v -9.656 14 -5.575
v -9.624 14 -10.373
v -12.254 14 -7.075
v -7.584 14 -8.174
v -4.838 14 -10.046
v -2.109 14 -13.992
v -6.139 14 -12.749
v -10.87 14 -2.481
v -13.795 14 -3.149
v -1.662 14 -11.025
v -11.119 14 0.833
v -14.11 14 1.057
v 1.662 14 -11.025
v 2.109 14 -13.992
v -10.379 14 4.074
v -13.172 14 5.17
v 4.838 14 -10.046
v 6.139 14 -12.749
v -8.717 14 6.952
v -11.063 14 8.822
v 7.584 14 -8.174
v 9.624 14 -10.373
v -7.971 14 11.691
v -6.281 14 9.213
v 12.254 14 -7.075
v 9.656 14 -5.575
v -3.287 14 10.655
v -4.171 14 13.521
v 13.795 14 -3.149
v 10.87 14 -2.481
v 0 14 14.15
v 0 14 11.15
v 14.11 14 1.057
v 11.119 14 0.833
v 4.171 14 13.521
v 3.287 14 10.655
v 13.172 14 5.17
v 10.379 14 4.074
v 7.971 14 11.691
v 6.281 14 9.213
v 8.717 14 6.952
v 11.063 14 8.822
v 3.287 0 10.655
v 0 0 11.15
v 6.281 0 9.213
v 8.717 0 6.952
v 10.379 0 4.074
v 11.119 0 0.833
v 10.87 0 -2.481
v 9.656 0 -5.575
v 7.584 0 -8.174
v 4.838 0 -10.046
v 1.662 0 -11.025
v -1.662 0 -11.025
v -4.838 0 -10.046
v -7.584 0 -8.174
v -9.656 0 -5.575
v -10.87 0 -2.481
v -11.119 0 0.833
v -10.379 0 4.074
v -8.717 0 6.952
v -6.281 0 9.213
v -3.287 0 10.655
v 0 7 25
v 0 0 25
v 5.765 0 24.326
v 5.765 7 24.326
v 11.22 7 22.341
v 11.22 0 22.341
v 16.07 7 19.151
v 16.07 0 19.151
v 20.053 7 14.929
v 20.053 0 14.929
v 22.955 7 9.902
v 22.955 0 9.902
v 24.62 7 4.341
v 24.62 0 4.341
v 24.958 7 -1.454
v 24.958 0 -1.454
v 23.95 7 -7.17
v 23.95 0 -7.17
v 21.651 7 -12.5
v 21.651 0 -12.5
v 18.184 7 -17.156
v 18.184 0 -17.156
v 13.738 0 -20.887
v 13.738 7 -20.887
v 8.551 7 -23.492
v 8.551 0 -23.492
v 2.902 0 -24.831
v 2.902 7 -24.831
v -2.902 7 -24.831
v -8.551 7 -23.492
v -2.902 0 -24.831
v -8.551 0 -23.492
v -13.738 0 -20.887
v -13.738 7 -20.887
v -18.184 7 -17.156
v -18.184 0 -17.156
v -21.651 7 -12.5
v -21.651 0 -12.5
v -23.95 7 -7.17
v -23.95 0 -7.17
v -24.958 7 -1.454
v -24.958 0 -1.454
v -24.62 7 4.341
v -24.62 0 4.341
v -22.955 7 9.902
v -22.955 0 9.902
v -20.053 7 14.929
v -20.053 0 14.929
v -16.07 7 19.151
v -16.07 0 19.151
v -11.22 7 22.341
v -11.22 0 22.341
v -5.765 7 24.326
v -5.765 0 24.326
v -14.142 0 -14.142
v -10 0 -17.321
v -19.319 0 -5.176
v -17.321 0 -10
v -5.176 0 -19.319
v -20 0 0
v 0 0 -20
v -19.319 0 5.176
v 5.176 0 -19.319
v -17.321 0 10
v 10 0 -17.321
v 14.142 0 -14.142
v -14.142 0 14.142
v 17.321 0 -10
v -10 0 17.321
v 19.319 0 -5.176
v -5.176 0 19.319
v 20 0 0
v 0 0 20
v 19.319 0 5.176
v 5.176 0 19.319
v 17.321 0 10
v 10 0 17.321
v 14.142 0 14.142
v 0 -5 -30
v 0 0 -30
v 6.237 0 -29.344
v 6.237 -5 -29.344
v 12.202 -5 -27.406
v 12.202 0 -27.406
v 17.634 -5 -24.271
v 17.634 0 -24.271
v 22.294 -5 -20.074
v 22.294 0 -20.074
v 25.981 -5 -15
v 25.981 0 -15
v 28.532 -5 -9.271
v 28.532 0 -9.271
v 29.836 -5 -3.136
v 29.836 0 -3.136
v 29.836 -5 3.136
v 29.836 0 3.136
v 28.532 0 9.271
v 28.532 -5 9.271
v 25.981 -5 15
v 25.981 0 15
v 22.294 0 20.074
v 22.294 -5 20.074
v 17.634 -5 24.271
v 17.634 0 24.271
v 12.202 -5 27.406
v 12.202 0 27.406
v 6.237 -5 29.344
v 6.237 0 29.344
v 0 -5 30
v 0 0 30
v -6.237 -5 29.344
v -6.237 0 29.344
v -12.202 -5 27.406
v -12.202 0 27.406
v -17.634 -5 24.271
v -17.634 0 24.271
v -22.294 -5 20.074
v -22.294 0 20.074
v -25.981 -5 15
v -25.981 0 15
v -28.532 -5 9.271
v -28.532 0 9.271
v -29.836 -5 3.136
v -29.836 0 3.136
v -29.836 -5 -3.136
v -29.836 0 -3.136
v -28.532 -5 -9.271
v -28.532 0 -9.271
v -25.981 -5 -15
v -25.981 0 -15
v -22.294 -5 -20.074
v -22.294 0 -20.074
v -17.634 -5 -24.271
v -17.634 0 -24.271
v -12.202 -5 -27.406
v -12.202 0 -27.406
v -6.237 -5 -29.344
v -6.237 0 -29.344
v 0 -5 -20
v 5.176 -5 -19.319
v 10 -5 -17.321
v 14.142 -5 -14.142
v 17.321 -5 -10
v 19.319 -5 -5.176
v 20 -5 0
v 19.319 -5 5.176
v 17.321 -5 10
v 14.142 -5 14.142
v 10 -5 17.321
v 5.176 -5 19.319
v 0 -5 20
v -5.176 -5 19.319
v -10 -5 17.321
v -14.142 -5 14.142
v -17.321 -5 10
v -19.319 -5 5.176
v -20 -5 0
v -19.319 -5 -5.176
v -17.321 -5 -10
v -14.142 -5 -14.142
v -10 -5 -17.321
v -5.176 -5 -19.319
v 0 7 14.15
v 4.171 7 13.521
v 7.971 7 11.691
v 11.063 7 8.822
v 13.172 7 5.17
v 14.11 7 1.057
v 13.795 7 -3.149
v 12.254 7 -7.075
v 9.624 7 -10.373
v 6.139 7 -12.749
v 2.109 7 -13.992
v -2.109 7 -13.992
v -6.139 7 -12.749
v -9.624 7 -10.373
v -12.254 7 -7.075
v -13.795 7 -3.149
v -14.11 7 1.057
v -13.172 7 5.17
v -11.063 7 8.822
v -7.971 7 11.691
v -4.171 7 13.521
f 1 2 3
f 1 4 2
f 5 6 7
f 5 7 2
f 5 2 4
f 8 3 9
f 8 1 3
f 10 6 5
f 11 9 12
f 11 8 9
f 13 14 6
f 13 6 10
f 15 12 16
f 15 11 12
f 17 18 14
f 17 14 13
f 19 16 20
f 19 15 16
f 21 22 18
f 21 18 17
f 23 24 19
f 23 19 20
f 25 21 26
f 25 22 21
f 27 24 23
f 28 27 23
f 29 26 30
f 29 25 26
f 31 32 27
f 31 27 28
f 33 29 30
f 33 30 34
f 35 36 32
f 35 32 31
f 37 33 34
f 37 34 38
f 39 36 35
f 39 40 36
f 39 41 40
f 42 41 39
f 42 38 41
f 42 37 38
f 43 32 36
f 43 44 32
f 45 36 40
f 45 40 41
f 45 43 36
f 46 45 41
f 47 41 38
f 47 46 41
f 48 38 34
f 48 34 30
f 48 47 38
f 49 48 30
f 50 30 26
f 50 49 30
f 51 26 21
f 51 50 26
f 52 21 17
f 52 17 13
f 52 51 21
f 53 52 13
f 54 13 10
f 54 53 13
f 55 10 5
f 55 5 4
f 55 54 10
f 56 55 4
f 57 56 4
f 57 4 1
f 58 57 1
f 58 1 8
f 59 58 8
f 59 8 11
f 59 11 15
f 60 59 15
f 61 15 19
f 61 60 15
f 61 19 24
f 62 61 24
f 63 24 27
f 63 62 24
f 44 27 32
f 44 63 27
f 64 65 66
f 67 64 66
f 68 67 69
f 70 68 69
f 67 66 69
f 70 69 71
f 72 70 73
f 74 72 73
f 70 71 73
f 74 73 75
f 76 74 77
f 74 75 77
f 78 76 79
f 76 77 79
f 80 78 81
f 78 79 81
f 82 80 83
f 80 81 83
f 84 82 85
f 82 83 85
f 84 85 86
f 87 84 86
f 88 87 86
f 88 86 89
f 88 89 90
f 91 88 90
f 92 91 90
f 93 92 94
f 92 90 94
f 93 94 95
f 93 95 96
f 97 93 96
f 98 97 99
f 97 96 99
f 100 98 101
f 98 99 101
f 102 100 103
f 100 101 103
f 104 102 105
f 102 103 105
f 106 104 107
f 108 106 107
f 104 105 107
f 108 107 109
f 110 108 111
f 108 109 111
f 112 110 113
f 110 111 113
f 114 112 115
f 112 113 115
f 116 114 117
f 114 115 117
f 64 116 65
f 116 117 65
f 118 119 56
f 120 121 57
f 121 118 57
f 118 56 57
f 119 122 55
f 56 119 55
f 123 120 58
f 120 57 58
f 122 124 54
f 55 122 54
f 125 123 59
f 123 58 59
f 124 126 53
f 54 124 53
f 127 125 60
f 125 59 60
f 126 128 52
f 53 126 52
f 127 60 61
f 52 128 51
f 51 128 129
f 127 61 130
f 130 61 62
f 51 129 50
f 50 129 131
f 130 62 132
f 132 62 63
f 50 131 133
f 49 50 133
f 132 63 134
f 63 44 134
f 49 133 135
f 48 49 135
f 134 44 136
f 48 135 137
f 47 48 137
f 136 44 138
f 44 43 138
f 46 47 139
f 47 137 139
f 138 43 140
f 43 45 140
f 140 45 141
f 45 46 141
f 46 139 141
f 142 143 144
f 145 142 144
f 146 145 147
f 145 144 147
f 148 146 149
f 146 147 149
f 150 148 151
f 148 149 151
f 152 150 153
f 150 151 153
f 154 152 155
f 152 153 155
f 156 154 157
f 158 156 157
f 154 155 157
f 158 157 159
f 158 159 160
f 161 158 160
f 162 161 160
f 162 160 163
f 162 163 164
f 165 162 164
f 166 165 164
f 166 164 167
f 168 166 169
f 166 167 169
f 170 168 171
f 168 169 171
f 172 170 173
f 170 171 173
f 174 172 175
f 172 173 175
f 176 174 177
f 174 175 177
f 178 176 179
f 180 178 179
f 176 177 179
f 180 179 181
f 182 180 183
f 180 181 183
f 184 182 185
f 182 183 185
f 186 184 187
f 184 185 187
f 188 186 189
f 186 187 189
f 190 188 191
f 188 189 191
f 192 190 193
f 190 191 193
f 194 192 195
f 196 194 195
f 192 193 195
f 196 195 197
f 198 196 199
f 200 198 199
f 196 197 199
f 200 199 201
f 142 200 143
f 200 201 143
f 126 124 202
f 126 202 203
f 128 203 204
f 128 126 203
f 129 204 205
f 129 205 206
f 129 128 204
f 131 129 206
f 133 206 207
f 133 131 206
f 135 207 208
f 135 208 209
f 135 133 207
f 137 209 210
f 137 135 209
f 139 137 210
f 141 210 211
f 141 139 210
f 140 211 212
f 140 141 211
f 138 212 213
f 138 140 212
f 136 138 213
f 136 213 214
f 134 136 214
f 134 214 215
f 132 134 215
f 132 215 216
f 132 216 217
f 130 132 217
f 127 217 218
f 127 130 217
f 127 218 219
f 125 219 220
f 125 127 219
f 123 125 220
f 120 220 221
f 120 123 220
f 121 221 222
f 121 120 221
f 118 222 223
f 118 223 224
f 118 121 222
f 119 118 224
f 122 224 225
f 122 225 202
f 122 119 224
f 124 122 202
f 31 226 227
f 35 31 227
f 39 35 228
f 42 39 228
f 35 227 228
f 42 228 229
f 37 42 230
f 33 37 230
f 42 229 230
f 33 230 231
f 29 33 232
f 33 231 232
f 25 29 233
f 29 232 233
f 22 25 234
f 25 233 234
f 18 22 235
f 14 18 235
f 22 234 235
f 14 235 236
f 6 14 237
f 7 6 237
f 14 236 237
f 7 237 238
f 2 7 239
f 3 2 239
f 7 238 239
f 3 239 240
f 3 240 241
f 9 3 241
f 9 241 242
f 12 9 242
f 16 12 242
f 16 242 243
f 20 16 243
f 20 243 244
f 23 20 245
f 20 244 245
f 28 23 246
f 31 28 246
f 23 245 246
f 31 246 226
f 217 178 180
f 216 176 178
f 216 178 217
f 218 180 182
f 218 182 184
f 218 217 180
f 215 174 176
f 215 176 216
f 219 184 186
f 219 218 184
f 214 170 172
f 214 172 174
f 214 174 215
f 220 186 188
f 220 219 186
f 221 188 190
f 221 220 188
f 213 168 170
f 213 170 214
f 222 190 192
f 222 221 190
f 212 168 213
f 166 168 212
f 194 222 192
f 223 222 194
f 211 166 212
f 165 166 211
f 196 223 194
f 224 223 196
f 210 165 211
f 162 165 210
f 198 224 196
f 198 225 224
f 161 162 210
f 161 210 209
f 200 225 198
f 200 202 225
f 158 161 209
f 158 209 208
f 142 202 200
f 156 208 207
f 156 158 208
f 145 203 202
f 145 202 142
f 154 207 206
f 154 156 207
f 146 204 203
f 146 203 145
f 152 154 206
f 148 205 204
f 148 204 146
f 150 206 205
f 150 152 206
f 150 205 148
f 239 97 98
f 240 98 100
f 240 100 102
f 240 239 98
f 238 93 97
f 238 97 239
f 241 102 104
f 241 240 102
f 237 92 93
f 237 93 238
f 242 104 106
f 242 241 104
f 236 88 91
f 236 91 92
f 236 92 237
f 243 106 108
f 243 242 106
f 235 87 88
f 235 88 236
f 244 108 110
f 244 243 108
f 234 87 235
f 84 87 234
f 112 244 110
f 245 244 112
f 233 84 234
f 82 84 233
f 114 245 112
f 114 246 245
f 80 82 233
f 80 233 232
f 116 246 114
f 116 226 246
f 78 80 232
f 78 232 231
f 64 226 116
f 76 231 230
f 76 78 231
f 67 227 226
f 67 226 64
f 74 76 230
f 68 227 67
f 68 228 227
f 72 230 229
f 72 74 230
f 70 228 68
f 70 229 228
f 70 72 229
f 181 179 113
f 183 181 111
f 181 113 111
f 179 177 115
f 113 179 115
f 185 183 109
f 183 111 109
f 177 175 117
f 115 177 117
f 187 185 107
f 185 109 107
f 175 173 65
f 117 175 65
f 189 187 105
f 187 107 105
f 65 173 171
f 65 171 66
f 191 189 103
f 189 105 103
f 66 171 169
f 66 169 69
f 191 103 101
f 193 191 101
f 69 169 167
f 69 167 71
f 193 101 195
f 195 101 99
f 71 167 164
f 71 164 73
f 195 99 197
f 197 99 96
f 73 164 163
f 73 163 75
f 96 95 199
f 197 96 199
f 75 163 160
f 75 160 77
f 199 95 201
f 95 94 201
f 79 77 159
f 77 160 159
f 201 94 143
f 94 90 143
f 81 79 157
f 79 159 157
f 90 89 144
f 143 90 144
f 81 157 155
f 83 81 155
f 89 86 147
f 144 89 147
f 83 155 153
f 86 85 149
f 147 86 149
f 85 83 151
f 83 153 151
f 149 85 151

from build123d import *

# Parameters (mm, degrees)
SKETCH1_R           = 25
SKETCH1_R_2         = 11.15
BOSS_EXTRUDE1_DEPTH = 7
SKETCH2_R           = 14.15
SKETCH2_R_2         = 11.15
BOSS_EXTRUDE2_DEPTH = 7
SKETCH3_R           = 30
SKETCH3_R_2         = 20
BOSS_EXTRUDE3_DEPTH = 5


with BuildPart() as part:
    # Sketch1 → Boss-Extrude1 (new body)
    with BuildSketch(Plane(origin=(0, 0, 0), x_dir=(1, 0, 0), z_dir=(0, 1, 0))):
        with Locations(Location((0, 0, 0), (0, 0, 270))):
            Circle(SKETCH1_R)
        with Locations(Location((0, 0, 0), (0, 0, 270))):
            Circle(SKETCH1_R_2, mode=Mode.SUBTRACT)
    extrude(amount=BOSS_EXTRUDE1_DEPTH)

    # Sketch2 → Boss-Extrude2 (add)
    with BuildSketch(Plane(origin=(0, 7, 0), x_dir=(1, 0, 0), z_dir=(0, 1, 0))):
        with Locations(Location((0, 0, 0), (0, 0, 270))):
            Circle(SKETCH2_R)
        with Locations(Location((0, 0, 0), (0, 0, 270))):
            Circle(SKETCH2_R_2, mode=Mode.SUBTRACT)
    extrude(amount=BOSS_EXTRUDE2_DEPTH)

    # Sketch3 → Boss-Extrude3 (add)
    with BuildSketch(Plane.XZ):
        with Locations(Location((0, 0, 0), (0, 0, 270))):
            Circle(SKETCH3_R)
        with Locations(Location((0, 0, 0), (0, 0, 270))):
            Circle(SKETCH3_R_2, mode=Mode.SUBTRACT)
    extrude(amount=BOSS_EXTRUDE3_DEPTH)


solid = part.part
